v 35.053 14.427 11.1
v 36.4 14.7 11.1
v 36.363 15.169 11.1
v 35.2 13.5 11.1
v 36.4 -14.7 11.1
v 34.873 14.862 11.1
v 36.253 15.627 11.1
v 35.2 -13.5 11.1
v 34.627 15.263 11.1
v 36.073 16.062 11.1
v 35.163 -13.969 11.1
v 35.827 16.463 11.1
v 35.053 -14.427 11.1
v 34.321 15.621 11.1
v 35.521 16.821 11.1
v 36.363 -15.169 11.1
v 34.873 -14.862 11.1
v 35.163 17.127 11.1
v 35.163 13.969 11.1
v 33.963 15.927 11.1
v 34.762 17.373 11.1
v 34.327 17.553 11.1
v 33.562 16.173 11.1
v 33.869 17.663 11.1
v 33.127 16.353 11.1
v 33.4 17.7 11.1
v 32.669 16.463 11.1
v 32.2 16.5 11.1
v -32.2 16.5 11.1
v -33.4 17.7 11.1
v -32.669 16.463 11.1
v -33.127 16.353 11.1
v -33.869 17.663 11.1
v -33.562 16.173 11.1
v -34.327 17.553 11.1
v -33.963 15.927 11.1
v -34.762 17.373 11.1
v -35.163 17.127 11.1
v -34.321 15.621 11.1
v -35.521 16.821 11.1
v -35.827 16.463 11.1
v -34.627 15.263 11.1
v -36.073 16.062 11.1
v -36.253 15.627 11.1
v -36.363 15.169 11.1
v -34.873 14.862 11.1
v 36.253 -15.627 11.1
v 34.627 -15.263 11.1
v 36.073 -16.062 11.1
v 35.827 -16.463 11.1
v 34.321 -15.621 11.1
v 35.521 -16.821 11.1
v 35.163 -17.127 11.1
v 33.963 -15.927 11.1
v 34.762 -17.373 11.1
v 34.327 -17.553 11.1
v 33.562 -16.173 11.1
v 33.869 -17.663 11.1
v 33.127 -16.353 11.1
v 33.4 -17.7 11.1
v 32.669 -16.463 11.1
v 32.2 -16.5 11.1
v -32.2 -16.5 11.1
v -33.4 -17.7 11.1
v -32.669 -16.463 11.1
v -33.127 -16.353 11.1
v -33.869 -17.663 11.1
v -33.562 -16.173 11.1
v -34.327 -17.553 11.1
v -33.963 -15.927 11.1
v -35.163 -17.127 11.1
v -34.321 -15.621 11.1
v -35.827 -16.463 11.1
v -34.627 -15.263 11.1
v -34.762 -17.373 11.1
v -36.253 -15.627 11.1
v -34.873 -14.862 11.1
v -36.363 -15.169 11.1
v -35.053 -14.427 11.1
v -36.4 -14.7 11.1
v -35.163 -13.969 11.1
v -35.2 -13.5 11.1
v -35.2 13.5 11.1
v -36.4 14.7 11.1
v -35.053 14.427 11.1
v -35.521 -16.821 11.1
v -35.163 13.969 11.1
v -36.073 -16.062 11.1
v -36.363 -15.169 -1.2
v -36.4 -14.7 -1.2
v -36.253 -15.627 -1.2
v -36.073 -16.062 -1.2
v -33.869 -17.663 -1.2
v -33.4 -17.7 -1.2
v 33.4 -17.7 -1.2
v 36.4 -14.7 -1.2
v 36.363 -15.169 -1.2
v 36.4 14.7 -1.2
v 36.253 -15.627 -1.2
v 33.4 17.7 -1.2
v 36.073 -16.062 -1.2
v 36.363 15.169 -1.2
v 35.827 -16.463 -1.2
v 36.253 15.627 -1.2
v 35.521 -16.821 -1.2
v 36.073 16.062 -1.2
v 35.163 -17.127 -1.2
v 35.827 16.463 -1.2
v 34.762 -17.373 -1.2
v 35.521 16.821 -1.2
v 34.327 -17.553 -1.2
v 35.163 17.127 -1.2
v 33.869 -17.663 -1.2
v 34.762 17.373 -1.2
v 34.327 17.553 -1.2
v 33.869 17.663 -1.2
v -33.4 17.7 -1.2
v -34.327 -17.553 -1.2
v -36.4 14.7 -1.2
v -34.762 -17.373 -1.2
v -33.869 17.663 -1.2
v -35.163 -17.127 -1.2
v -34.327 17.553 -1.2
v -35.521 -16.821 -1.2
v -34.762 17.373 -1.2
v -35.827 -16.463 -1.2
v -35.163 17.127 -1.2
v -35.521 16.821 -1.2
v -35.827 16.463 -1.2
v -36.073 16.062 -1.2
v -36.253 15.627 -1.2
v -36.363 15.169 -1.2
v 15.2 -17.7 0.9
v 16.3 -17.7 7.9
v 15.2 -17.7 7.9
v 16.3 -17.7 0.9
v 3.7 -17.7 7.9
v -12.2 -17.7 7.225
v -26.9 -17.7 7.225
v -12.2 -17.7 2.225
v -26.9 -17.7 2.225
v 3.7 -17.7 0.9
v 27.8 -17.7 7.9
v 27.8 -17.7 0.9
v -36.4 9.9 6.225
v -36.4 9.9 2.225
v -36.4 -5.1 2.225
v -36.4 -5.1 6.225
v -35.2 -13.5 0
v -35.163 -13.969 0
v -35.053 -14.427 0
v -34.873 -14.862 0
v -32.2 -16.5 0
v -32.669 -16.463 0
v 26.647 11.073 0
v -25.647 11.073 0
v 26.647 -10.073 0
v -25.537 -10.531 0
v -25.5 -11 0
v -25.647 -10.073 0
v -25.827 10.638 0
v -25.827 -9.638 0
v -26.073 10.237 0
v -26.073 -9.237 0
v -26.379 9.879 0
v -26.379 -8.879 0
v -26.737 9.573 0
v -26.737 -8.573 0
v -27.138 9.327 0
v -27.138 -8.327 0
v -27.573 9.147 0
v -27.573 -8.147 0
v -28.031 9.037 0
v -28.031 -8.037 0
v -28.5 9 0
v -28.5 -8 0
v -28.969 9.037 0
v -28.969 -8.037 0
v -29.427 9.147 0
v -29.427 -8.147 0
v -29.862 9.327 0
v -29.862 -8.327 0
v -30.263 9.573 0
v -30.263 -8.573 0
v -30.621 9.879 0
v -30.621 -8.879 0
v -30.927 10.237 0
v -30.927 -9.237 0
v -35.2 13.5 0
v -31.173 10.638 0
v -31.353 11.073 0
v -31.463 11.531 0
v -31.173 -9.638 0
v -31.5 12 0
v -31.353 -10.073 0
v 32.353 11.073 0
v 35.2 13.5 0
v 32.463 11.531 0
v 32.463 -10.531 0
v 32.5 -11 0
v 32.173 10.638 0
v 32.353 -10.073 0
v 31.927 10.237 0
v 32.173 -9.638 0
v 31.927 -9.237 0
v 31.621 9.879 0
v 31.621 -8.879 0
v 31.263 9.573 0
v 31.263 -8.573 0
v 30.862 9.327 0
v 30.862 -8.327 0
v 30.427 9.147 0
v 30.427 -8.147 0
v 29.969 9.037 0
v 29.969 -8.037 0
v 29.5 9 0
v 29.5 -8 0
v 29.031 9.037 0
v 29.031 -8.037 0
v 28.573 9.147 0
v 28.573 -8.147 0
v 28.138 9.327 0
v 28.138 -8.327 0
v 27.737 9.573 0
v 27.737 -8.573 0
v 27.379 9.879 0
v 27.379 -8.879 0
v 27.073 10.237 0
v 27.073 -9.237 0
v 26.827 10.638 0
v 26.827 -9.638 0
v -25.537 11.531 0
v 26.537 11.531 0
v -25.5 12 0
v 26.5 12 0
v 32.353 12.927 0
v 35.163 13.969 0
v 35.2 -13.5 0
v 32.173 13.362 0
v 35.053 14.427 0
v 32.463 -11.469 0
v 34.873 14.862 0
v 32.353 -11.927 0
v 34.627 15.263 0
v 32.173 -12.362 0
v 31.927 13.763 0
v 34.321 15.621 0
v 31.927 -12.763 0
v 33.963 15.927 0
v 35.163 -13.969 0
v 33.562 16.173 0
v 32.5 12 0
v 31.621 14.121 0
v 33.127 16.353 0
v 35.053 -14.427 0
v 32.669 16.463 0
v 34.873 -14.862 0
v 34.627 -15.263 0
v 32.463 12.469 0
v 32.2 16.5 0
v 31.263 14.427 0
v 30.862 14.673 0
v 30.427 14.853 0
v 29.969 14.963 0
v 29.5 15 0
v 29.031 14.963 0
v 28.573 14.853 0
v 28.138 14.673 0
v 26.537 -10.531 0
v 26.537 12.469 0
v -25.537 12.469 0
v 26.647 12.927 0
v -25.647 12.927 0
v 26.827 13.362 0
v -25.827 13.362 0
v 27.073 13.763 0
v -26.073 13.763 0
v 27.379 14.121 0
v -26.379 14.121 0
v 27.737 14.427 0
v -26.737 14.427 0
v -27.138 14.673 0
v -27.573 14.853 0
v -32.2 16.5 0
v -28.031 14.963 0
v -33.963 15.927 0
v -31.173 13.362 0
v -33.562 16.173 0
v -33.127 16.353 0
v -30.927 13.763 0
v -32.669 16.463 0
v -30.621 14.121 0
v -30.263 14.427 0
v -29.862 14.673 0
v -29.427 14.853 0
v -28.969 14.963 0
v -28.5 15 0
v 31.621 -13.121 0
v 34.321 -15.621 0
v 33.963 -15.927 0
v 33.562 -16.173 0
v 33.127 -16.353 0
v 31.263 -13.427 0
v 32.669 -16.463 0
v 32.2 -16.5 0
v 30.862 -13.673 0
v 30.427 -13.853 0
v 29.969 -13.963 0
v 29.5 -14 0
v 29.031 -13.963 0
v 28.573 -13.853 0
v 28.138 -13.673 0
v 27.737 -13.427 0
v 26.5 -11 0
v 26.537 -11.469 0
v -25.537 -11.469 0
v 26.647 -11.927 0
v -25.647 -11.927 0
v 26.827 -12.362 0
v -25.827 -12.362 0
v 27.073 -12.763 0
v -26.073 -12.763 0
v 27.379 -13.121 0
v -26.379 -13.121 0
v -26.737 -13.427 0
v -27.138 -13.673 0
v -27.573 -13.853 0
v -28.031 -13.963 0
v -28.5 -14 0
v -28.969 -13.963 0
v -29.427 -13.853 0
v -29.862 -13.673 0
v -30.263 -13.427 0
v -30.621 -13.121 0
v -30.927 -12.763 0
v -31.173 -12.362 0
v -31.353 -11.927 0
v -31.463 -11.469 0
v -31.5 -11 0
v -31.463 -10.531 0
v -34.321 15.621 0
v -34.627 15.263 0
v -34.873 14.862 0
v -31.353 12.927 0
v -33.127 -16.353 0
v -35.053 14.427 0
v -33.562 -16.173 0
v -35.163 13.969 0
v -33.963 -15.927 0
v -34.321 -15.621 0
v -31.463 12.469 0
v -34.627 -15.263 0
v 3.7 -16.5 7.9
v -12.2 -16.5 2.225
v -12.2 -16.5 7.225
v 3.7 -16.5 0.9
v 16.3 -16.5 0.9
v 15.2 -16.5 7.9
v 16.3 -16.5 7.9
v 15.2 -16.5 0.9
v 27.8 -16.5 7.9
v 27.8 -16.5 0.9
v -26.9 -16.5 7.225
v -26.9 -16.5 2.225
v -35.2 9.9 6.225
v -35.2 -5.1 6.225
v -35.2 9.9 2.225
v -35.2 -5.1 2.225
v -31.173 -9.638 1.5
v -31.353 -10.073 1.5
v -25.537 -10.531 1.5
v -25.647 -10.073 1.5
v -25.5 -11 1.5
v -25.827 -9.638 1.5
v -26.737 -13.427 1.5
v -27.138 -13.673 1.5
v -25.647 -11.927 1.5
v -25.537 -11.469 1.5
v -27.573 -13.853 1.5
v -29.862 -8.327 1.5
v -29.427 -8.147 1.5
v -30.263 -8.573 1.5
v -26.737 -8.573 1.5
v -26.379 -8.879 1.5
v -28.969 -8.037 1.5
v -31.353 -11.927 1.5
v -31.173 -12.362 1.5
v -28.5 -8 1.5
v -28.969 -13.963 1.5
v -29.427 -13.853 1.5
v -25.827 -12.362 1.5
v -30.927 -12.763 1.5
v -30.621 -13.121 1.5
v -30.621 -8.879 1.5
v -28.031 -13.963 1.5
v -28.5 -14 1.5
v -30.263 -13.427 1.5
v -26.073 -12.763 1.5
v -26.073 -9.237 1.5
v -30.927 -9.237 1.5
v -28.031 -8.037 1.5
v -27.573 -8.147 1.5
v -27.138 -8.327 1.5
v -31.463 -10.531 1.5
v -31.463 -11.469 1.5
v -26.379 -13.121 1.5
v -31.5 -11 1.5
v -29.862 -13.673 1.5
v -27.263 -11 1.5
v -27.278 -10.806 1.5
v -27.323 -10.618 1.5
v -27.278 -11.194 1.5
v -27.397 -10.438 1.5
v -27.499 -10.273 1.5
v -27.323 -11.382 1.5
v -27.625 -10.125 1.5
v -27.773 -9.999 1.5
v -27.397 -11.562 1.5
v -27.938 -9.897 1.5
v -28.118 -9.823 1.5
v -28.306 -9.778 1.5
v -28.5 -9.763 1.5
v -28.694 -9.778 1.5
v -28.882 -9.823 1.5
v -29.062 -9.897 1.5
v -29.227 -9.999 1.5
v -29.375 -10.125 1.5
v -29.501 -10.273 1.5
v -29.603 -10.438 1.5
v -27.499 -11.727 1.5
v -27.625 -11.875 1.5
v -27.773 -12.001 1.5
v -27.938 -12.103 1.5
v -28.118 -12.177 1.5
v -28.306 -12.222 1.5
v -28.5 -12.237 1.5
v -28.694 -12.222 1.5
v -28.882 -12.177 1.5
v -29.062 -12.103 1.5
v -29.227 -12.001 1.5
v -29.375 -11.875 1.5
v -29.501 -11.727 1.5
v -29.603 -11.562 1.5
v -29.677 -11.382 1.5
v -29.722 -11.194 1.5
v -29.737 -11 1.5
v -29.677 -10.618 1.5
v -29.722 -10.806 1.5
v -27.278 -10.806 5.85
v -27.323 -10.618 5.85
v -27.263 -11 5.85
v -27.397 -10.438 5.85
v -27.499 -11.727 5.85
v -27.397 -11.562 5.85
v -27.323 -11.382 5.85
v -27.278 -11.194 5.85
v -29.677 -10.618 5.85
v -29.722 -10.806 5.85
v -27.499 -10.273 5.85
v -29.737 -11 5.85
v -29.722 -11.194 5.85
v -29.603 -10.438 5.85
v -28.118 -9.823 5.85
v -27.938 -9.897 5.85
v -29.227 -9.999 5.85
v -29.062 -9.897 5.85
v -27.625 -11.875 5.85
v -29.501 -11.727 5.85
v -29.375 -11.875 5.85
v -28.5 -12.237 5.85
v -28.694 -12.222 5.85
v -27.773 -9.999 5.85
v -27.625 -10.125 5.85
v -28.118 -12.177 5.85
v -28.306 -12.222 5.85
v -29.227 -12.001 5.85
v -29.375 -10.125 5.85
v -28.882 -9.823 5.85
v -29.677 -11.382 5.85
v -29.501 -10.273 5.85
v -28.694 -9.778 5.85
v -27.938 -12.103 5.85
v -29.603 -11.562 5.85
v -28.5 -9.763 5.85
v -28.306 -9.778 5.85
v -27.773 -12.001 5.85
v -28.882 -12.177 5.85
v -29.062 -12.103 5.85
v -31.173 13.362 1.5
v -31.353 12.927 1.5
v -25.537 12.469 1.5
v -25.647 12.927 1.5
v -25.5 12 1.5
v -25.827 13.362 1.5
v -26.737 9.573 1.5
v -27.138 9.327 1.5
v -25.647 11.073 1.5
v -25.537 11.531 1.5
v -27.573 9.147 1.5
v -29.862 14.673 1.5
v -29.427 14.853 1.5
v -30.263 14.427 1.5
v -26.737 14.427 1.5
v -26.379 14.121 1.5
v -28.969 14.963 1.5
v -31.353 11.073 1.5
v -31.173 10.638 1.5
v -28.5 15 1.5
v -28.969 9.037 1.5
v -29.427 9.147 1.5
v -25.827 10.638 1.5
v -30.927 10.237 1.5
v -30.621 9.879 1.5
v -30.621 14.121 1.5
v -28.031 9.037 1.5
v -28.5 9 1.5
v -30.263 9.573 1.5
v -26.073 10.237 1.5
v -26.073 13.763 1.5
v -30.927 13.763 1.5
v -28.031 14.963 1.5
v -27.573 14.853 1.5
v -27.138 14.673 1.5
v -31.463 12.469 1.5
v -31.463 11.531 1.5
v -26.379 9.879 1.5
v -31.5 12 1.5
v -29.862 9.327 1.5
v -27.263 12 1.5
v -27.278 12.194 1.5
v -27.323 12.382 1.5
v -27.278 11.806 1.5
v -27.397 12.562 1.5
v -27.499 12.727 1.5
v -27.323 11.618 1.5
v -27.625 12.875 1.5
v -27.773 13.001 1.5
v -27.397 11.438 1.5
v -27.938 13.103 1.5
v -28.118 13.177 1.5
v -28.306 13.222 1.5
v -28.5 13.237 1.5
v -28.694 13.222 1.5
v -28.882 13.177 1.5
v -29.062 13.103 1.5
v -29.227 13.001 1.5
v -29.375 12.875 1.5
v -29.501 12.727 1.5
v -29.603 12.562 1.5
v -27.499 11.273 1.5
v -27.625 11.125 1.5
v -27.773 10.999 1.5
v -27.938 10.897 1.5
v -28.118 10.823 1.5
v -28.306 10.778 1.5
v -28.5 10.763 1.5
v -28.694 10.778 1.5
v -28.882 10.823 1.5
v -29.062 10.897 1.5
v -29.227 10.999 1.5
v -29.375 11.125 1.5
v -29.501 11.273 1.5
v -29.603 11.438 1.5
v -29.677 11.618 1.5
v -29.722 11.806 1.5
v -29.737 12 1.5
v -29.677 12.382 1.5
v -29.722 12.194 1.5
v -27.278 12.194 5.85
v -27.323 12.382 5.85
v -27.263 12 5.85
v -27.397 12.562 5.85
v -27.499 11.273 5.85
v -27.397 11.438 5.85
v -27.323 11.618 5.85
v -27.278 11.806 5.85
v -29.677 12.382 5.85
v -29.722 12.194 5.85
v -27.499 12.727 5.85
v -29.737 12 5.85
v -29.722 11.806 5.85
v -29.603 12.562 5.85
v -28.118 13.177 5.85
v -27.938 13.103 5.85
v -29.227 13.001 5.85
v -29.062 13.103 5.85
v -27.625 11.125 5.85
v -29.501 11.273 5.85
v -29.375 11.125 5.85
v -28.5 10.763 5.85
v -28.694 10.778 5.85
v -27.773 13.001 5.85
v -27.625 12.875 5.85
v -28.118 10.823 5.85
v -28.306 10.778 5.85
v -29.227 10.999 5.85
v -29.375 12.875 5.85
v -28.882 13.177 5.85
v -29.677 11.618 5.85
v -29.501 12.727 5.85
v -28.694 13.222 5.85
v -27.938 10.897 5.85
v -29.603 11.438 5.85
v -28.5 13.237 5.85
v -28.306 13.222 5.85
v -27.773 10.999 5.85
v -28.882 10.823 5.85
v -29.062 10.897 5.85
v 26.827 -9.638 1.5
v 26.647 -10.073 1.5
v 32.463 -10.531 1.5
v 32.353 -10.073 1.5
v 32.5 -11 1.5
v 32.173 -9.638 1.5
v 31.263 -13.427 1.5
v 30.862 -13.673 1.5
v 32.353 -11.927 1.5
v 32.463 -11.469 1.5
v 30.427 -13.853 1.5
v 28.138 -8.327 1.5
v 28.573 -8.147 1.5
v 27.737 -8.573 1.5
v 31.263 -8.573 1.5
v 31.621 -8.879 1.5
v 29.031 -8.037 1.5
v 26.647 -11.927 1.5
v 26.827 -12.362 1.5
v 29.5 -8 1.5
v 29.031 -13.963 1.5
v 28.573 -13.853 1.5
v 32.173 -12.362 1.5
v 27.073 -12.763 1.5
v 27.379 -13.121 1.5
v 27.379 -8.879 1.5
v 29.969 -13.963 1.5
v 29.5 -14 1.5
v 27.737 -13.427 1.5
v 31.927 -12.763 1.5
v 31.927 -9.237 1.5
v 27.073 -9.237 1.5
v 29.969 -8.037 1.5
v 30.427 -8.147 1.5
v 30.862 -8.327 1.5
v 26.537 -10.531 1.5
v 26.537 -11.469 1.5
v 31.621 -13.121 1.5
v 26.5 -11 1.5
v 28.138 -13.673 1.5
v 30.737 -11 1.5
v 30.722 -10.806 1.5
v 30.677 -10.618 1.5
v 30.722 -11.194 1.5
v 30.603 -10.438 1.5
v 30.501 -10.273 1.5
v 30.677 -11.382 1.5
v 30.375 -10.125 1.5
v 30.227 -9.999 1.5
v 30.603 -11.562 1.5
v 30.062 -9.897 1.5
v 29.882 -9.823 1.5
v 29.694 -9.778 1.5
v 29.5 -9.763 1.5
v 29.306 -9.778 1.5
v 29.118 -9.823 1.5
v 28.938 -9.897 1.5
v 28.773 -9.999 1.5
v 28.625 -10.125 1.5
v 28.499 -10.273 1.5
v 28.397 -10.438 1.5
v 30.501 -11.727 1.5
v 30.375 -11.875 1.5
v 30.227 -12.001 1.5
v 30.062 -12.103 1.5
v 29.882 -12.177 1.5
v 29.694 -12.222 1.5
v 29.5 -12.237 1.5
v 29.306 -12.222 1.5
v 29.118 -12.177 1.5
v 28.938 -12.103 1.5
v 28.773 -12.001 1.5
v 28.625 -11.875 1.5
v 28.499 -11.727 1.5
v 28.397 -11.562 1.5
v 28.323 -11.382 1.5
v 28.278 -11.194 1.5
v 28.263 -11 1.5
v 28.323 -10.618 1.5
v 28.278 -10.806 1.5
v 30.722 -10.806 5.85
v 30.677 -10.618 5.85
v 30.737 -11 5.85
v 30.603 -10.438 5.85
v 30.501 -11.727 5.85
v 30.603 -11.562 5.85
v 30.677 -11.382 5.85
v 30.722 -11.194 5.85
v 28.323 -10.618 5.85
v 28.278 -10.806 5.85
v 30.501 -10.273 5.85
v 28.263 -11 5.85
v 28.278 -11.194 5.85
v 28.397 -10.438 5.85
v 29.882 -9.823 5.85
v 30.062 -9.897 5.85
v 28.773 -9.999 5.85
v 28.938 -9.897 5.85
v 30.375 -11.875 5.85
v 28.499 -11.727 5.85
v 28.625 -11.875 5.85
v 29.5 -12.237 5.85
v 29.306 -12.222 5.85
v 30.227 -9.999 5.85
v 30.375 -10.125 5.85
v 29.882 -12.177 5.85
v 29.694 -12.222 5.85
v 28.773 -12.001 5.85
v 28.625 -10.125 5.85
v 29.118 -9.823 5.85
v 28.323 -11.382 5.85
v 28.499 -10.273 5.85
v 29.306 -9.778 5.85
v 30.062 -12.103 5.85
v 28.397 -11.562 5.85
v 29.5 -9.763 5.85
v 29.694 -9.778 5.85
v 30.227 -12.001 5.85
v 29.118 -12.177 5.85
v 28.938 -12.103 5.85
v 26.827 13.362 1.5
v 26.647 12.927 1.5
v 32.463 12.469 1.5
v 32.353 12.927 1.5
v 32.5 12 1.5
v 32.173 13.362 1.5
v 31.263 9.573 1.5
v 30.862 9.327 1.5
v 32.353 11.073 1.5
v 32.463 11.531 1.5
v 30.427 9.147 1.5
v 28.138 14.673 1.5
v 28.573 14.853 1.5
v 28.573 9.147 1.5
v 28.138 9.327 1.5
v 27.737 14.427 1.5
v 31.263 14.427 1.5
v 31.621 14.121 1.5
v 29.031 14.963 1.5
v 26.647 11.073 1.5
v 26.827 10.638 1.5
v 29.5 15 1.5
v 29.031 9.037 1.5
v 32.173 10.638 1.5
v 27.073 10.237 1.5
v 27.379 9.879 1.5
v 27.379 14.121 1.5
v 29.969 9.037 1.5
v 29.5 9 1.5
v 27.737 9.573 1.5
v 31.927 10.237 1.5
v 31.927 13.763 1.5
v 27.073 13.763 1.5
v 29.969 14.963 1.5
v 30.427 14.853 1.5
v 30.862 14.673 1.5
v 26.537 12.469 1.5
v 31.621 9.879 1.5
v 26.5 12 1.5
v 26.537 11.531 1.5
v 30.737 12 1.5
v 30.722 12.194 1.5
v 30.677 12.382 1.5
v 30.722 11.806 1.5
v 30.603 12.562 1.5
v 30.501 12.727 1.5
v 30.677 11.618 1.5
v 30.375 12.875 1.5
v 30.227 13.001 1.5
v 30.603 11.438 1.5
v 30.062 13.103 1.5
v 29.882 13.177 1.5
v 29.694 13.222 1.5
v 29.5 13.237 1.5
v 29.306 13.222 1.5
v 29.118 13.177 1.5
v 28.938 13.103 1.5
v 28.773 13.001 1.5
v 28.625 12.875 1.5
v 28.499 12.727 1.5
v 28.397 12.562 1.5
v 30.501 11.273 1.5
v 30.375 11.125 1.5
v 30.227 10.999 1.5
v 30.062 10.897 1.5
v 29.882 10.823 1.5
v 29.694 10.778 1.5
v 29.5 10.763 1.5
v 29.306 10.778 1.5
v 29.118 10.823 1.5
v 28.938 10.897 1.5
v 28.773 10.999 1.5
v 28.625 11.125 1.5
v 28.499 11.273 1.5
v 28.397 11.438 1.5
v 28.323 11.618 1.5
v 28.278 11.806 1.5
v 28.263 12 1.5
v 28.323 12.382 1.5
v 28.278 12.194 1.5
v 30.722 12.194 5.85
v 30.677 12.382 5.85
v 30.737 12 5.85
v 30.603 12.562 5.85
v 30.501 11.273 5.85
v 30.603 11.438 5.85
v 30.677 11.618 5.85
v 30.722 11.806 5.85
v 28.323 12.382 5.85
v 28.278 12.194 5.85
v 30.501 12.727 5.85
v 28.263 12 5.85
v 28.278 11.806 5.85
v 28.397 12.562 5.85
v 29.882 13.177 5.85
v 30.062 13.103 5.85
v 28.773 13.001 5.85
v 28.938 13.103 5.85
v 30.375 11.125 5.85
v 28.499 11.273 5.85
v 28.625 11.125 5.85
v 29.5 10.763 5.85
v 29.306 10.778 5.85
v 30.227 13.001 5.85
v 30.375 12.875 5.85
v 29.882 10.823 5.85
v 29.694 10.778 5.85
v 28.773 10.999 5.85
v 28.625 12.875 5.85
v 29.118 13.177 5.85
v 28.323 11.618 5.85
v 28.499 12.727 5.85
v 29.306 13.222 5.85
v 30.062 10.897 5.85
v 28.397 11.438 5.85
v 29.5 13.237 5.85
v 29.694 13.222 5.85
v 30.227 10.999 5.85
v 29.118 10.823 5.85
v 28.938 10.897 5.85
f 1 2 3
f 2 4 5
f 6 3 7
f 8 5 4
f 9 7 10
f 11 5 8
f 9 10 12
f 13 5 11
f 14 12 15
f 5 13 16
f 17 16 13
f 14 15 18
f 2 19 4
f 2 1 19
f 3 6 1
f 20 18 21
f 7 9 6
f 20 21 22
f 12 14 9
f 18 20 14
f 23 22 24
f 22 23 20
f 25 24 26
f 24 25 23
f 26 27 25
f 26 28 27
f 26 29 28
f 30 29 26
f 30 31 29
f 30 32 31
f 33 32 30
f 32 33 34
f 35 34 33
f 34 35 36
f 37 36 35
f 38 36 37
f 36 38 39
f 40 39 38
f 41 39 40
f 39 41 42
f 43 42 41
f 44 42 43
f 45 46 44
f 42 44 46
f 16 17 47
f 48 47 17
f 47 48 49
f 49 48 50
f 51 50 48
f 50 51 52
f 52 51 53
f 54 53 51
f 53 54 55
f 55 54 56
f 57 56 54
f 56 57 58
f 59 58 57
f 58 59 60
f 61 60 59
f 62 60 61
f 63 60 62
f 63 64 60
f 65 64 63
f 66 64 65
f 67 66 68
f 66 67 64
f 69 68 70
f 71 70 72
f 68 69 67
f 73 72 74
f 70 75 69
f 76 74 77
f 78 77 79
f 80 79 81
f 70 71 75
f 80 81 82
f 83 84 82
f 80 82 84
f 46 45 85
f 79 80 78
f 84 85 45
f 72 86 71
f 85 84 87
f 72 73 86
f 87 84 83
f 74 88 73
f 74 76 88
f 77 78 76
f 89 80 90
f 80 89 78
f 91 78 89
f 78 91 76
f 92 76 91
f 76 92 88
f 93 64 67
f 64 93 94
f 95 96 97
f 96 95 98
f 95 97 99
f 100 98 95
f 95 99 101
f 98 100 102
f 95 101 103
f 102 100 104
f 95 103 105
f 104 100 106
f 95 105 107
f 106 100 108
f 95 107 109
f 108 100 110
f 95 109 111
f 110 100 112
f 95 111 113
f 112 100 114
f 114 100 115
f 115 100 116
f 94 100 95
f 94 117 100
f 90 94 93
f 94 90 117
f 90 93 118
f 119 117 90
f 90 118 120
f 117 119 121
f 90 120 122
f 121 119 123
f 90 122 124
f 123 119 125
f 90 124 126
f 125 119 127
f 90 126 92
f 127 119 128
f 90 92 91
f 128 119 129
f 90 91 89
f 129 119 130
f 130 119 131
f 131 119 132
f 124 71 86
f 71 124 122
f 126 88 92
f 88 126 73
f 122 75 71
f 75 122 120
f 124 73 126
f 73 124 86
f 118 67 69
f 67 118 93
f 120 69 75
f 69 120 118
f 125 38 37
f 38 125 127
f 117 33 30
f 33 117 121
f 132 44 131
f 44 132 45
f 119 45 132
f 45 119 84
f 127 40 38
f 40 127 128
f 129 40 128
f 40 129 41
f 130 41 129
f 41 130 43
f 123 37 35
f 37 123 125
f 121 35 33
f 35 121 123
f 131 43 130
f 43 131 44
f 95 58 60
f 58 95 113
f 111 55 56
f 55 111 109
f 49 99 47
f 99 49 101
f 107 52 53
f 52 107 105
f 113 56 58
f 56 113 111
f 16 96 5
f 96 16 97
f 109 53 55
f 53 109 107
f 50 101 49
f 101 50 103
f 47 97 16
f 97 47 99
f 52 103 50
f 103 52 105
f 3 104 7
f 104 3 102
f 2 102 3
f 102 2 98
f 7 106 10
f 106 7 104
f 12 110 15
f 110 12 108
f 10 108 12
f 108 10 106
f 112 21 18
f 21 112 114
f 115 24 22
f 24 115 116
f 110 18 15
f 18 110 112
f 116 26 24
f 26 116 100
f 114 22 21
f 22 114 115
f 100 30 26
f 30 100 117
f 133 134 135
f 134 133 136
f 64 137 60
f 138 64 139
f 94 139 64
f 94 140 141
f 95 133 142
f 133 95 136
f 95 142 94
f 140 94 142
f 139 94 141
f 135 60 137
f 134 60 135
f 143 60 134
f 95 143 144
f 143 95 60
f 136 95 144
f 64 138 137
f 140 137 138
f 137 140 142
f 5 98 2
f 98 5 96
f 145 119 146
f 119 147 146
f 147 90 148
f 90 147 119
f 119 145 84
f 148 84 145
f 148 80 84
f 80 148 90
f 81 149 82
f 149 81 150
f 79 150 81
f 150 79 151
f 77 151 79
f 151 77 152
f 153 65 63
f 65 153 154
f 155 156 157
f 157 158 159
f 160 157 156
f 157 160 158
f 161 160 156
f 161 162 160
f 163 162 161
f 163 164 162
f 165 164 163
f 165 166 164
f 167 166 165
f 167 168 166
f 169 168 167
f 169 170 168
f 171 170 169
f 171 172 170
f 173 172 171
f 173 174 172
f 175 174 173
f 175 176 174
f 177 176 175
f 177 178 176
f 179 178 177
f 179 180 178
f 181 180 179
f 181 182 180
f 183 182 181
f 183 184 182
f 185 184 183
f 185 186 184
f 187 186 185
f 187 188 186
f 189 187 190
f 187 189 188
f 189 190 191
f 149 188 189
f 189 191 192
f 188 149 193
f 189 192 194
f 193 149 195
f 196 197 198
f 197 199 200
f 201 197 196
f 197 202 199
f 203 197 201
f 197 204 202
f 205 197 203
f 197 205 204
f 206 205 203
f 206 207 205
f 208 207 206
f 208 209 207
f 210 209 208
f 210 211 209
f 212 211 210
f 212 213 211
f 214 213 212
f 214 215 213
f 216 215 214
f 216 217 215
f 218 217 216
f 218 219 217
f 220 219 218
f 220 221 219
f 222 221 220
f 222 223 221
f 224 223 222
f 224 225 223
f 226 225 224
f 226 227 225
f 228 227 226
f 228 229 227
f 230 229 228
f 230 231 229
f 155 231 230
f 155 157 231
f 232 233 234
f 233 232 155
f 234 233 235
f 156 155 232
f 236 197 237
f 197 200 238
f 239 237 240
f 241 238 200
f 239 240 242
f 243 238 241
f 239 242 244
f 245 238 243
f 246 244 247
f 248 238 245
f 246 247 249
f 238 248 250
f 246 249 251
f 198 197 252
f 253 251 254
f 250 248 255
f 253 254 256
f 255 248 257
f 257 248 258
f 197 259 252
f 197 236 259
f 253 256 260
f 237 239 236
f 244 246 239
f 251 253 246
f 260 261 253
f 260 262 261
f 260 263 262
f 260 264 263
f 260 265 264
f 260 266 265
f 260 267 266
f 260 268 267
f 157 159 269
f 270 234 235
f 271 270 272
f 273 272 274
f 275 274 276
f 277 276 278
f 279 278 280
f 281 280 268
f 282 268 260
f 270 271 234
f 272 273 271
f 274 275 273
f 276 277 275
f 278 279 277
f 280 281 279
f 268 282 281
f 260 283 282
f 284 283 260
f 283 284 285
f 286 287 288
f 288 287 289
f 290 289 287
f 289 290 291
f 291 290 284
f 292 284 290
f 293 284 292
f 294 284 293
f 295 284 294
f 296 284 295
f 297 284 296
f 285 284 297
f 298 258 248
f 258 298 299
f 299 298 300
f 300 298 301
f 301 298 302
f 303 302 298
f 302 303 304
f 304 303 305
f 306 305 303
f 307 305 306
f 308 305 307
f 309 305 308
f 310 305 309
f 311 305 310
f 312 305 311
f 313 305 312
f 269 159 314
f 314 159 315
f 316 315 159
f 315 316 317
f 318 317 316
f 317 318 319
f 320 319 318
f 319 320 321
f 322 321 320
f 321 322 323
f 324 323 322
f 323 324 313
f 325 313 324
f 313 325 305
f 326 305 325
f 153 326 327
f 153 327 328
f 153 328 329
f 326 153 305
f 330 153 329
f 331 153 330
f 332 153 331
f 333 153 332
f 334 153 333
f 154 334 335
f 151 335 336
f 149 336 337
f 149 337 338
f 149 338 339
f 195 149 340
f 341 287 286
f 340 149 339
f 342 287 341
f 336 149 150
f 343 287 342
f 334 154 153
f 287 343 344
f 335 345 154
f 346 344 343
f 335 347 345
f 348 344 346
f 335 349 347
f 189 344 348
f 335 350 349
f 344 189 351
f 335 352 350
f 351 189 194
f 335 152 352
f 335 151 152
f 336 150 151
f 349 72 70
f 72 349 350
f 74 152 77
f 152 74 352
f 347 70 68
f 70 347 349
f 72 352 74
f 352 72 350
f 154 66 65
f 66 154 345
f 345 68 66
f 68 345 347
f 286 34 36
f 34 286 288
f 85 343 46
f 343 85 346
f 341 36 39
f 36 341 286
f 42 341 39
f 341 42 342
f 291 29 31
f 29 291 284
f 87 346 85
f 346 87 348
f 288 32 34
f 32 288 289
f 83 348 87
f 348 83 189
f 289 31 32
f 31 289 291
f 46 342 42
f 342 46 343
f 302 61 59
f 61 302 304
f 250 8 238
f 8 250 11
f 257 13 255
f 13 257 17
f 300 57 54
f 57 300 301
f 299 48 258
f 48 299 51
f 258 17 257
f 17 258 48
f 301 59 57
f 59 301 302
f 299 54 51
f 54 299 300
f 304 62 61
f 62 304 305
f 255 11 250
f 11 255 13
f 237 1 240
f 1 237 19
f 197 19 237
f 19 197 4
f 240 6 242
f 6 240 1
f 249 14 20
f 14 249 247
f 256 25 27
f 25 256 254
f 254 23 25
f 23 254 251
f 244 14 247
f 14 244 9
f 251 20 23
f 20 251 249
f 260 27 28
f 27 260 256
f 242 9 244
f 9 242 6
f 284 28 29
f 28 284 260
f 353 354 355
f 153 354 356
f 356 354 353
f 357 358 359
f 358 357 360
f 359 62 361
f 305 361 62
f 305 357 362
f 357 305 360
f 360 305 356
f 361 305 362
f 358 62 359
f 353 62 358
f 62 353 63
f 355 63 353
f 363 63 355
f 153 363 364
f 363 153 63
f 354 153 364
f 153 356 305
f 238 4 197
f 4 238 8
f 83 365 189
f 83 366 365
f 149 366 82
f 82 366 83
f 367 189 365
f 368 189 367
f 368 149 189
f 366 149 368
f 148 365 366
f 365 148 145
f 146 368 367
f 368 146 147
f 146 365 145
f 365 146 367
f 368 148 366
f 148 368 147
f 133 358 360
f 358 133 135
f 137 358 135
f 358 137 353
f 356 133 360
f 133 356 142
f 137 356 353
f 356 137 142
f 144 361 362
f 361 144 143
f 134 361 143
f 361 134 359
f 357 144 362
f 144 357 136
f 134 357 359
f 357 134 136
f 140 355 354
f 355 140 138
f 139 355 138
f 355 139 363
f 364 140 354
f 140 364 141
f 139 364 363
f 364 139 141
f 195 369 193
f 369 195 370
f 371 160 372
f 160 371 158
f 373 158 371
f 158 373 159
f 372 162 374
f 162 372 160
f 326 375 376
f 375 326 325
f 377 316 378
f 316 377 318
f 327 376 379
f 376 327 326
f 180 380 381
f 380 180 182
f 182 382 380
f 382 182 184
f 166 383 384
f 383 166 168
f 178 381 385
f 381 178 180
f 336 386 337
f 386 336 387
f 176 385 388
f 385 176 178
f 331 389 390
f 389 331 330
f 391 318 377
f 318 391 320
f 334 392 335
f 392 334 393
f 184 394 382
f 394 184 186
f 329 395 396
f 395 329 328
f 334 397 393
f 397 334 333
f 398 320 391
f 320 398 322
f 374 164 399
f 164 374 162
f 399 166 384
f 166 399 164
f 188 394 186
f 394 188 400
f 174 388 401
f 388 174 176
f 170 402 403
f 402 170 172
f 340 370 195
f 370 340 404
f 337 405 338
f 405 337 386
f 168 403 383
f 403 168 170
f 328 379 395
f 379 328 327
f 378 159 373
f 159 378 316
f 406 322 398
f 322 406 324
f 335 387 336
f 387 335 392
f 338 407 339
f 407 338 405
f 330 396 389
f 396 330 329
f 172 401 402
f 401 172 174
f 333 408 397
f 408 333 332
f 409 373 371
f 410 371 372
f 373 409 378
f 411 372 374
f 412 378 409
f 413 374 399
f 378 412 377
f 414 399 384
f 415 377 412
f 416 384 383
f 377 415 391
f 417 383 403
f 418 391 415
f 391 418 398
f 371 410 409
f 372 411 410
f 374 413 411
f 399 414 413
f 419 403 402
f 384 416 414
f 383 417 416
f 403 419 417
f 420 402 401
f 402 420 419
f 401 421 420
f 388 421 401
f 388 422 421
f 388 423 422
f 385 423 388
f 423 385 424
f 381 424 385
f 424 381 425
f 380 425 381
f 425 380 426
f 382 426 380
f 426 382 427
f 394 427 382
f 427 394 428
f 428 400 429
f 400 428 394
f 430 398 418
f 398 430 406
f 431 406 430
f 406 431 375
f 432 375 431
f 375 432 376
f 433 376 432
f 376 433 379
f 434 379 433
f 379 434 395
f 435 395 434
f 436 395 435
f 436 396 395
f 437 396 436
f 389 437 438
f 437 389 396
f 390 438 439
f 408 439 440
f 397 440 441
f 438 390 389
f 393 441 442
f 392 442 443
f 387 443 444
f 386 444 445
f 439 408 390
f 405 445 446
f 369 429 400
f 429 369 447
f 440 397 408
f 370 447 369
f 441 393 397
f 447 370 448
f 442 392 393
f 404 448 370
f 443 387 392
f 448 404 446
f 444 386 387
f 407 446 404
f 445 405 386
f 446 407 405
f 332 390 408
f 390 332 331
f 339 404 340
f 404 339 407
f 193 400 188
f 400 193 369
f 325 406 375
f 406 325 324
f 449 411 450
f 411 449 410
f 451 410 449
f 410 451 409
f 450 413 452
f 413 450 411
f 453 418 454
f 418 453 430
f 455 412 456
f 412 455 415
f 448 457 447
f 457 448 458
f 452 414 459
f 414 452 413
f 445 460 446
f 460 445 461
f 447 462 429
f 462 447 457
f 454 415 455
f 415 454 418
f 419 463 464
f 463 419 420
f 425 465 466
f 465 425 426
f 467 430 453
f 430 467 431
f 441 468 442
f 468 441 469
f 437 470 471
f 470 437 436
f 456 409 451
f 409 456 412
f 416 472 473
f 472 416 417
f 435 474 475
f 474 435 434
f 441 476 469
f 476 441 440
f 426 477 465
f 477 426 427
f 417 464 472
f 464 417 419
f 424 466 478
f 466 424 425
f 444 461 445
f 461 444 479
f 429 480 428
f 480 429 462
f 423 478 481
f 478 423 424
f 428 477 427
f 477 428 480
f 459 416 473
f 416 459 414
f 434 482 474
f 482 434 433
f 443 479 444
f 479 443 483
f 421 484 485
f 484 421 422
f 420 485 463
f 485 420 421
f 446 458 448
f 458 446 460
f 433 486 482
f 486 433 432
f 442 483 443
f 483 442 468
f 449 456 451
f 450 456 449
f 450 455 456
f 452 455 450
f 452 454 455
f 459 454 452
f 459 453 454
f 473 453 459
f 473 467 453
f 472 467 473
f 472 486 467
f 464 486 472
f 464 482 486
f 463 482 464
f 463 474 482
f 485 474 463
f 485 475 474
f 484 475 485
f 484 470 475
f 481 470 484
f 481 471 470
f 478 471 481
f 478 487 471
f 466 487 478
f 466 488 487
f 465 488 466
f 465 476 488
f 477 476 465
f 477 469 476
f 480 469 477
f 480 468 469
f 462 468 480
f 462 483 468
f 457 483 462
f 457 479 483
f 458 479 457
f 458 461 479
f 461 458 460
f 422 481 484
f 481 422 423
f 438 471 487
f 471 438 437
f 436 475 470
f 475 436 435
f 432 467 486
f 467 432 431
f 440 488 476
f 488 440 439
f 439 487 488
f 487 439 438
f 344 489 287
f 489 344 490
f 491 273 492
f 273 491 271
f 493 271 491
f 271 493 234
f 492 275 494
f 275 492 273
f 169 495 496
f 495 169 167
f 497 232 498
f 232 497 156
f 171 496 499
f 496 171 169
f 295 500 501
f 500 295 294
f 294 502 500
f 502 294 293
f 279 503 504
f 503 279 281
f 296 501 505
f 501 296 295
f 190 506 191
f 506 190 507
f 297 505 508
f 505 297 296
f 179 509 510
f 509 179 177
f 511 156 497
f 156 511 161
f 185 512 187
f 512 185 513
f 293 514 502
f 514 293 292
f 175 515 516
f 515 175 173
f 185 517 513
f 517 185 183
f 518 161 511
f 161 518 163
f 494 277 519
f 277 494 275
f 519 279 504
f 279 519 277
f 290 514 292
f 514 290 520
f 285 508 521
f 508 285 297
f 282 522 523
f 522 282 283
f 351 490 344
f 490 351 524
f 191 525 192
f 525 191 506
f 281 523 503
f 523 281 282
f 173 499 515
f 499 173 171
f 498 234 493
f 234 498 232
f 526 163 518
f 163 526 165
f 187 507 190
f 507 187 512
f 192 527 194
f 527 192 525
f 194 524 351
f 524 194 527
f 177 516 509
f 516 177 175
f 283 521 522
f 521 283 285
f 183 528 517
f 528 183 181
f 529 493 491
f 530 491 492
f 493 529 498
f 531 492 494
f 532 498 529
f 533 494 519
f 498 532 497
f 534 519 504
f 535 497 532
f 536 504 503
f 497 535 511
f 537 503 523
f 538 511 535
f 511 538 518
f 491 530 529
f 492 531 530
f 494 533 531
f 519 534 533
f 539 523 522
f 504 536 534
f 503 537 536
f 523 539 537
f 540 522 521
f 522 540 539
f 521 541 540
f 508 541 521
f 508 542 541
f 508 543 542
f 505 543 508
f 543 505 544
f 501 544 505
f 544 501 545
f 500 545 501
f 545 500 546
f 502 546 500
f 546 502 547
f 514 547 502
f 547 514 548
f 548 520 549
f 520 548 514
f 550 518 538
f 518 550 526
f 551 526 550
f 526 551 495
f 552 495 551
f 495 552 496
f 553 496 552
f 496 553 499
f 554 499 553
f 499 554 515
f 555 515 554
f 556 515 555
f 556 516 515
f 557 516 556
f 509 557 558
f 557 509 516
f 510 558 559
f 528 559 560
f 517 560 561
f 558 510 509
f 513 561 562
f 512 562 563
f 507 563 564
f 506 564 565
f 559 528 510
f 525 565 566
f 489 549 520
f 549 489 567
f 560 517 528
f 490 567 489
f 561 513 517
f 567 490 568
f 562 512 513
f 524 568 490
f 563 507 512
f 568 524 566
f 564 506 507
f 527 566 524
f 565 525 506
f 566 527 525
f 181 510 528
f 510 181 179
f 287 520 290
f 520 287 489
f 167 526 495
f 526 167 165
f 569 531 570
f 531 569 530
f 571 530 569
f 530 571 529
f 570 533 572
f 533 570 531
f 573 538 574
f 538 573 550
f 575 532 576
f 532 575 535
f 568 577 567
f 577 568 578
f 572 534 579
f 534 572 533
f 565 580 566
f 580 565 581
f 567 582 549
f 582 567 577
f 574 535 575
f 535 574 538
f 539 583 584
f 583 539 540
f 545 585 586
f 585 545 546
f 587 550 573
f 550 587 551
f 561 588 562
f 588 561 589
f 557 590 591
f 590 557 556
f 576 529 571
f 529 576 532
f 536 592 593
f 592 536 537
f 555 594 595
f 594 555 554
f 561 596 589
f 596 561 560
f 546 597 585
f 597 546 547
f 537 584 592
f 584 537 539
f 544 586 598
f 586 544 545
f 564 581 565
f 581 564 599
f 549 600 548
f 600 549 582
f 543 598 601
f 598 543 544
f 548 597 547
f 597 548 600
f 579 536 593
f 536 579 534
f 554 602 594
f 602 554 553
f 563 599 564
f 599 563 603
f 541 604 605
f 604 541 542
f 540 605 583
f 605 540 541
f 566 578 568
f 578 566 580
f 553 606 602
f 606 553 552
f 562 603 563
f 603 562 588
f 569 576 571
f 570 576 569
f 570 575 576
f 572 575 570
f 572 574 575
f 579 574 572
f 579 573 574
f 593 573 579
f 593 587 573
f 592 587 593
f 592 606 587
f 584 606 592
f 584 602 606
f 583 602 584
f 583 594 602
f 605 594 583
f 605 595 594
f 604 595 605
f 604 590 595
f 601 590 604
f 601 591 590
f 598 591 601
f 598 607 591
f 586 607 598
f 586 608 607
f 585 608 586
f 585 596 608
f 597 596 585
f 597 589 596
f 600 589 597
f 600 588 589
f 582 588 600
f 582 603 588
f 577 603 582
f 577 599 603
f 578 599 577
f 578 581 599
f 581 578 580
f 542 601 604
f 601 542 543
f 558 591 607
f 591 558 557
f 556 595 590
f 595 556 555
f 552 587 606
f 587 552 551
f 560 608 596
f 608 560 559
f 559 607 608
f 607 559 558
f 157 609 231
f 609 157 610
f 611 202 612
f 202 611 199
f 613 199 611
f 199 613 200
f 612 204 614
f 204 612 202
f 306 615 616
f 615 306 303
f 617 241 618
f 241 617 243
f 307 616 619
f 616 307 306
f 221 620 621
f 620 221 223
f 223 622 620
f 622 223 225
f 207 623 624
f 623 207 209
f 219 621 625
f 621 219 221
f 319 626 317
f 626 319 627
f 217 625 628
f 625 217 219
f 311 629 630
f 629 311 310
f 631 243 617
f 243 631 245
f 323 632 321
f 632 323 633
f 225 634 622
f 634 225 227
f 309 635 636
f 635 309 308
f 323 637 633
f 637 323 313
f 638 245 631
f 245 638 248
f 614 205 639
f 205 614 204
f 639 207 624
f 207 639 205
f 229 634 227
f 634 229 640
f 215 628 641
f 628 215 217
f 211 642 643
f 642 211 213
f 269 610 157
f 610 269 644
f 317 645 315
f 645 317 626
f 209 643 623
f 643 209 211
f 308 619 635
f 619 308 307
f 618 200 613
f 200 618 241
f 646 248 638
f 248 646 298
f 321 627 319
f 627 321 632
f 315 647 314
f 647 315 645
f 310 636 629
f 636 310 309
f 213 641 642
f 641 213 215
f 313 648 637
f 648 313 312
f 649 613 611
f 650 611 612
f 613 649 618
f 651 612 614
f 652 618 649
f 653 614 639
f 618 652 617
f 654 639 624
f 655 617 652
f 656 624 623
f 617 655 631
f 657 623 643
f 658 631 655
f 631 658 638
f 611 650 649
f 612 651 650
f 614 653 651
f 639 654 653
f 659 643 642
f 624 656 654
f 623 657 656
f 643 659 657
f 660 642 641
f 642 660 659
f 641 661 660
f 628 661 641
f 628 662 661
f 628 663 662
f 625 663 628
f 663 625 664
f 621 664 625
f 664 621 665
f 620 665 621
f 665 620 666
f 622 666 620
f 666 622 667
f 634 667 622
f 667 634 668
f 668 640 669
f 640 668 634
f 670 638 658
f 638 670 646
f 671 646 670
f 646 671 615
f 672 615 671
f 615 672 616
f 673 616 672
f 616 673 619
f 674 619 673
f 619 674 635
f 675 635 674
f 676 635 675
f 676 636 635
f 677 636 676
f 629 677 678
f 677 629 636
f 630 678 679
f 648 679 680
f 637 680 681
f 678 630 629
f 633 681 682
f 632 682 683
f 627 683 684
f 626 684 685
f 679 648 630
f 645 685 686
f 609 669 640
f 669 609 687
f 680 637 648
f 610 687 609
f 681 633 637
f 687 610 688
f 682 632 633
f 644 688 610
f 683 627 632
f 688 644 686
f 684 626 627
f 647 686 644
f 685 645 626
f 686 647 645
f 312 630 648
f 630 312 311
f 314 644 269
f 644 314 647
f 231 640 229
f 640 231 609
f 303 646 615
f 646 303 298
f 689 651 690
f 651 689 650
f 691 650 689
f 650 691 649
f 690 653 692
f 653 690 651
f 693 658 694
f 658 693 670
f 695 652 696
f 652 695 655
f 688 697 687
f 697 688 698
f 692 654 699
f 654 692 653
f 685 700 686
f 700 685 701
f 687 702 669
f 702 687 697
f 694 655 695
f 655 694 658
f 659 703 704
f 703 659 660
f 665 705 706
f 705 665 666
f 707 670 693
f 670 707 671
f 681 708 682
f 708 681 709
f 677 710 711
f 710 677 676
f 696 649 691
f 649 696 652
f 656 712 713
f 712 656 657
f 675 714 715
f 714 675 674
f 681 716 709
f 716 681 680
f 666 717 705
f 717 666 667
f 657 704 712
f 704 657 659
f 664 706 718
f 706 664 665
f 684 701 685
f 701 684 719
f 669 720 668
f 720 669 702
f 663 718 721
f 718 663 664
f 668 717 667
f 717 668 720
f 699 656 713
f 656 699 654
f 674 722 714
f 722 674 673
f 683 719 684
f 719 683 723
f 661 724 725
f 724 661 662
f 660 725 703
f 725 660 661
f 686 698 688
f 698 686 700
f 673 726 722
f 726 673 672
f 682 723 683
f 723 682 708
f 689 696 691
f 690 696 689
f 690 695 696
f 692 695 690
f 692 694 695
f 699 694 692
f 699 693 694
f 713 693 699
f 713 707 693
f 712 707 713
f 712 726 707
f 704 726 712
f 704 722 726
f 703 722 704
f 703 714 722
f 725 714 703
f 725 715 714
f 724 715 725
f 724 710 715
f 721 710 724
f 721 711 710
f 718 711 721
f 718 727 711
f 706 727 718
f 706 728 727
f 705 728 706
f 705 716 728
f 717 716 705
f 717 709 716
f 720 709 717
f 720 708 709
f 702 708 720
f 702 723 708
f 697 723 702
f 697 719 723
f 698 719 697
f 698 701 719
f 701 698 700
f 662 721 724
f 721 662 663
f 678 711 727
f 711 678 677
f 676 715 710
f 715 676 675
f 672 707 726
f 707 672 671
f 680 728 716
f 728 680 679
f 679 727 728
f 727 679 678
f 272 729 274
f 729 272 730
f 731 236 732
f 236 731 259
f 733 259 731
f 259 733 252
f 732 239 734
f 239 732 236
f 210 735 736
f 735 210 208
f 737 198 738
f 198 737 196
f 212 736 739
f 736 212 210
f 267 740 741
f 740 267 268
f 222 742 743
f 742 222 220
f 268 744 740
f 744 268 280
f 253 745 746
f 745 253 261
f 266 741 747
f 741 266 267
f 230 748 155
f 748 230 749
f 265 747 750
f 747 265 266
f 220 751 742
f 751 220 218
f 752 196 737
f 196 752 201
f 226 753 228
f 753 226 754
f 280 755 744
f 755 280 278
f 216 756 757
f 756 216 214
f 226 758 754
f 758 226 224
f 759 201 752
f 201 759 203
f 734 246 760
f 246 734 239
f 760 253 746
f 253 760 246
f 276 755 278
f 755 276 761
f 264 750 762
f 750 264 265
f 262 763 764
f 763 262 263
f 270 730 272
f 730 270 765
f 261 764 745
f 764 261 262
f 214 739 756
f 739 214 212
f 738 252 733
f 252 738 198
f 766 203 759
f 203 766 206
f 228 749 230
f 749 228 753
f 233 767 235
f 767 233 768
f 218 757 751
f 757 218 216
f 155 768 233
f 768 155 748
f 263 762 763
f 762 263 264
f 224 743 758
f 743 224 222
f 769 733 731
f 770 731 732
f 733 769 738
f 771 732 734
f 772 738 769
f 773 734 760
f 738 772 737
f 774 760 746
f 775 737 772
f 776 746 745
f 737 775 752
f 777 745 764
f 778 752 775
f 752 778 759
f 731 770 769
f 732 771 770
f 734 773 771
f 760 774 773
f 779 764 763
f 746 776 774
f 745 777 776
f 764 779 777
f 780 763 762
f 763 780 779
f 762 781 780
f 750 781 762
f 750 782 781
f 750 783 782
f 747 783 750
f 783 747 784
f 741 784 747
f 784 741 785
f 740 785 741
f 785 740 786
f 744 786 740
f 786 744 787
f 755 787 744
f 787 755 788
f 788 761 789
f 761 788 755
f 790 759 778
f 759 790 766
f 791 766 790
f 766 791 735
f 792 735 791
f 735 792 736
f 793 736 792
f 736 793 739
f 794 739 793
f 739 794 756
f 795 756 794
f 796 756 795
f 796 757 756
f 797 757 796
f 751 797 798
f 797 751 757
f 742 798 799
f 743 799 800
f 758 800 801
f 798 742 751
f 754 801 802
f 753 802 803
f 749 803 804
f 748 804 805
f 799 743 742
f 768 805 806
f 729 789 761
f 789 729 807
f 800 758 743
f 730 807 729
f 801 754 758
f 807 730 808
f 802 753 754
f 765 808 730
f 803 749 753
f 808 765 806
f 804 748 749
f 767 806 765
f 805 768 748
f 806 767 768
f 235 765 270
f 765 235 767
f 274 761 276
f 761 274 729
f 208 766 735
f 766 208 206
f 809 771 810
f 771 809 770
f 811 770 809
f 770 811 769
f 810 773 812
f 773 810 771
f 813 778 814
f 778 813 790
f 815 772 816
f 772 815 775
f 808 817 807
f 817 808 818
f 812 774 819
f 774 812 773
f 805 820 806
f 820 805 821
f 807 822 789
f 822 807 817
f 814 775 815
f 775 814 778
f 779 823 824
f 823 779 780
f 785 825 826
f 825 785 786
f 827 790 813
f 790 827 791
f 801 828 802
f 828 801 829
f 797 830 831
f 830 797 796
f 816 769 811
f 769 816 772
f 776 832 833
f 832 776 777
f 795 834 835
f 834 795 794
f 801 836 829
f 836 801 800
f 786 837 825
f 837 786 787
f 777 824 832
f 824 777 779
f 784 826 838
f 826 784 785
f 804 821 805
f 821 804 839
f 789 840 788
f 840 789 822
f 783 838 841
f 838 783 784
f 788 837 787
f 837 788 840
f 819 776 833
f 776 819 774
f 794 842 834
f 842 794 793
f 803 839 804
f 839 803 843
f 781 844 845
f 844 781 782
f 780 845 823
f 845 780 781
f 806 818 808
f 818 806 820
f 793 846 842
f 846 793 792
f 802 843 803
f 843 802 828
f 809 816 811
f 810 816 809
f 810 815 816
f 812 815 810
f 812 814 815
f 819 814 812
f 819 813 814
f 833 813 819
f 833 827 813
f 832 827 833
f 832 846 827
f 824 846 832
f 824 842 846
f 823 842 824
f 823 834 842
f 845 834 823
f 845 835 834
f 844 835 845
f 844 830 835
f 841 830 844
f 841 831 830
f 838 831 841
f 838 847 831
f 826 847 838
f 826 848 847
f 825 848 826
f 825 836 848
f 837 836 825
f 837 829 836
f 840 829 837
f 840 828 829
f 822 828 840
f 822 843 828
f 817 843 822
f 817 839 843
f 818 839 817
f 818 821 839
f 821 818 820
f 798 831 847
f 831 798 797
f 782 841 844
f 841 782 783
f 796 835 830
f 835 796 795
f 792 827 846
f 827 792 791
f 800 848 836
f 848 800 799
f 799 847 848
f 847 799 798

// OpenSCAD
/*
    A box for the pizero(/w).
    Designed to allow the pizero to be completely in the box, resiliant to
    dust and pokey fingers.
    
    * Configurable connector holes
    * Either holes, for screws/bolts, or mounting pins for the pizero
    * Engineering model of a pizero, so you can check if it looks right
        - remember to turn this off before generating an STL
        
    TODO:
    * Calculate everything, remove magic numbers
    * Cut outs the gland on the lid to allow connectors right into the pizero
*/

// THINGIVERSE customizer does not understand true/flase, so use 1/0 instead

/* [parts] */
make_bottom=1;   // [0:No,1:Yes] 
make_top=0;      // [0:No,1:Yes] 

/* [connectors] */
sdcard_hole = 1; // [0:No,1:Yes] 
power_hole = 1;  // [0:No,1:Yes] 
hdmi_hole = 1;   // [0:No,1:Yes] 
usb_hole = 1;    // [0:No,1:Yes] 
camera_hole = 0; // [0:No,1:Yes] 
gpio_hole = 1;   // [0:No,1:Yes] 
pins = 1;        // [0:No,1:Yes] 

/* [box] */
// gap around pizero inside the box
gap = 1.0;
// wall thickness of box
shell_thickness = 1.2;
// standoffs pizero sits on in the box
standoffs = 1.5;

/* [Text on lid] */
// Add an engraved text on the top, 'help->font list' for available
add_text = 1;  // [0:No,1:Yes]
lid_text = "pizerow";
text_font="Comic Sans MS"; 

/* [pizero options] */
// show an engineering model
dummy_pizero = 0;  // [0:No,1:Yes] 
// do we need height for a header
//pz_header = 0; // not tested, problems with heights 
// allow for solder on bottom, standoffs take care of this
//pz_solder = 0;    // don't need to allow for this as we have standoffs

// the pizero engineering model with the measurements we use, includes don't work in thingiverse customizer
//include <pizerow.scad>;

//////////////////////////////
//
// Start of included pizero engineering model
//
////////////////////
/* [pizero dimensions DO NOT ALTER] */
pz_length = 65; // not including sd card protrusion
pz_width = 30;  // not including any connector protrusions
pz_pcb_thickness = 1.45; // including solder mask
pz_component_max_height = (3.1 - pz_pcb_thickness); // hdmi is max
pz_rounded_edge_offset = 3.0;
pz_botton_pin_height = 1.0;  // solder pins for gpio connector

pz_mount_hole_dia = 2.75; 
pz_mount_hole_offset = 3.5; // from edge
pz_mount_hole_dia_clearance = 6; 

pz_gpio_length = 50.8; // total 
pz_gpio_width = 5;  // total
pz_gpio_x_offset = 32.5;  // from left hand edge to centre of connector
pz_gpio_y_offset = 3.5; // long edge centre form pcb edge
pz_gpio_height = (9.8 - pz_pcb_thickness); // wihtout pcb thickness

pz_sdcard_y_offset = 16.9;
pz_sdcard_length = 15.4; // sdcard present
pz_sdcard_width = 12;
pz_sdcard_protrusion = 2.3; // sdcard present
pz_sdcard_height = (2.8 - pz_pcb_thickness); 

pz_camera_y_offset = 15;
pz_camera_length = 4.43;
pz_camera_width = 17;
pz_camera_protrusion = 1.1; // no cable present
pz_camera_height = (2.65 - pz_pcb_thickness);

pz_hdmi_x_offset = 12.4;
pz_hdmi_length = 11.2;
pz_hdmi_width = 7.6;
pz_hdmi_protrusion = 0.5; // no cable present
pz_hdmi_height = (4.7 - pz_pcb_thickness);

pz_usb_power_x_offset = 54;
pz_usb_x_offset = 41.4;
pz_usb_length = 8;
pz_usb_width = 5.6;
pz_usb_protrusion = 1; // no cable present
pz_usb_height = (3.96 - pz_pcb_thickness);

pz_max_length = pz_length + pz_sdcard_protrusion + pz_camera_protrusion;
pz_max_width = pz_width + pz_usb_protrusion;
///////////////////////////////////
//
// End of pizero definitions
//
////////////////////

//////////////////////////////////
//
// Start of pizero functions/modules
//
////////////////////////
function pz_get_max_height(gpio_header, gpio_solder) =
    pz_pcb_thickness  + 
    (pz_botton_pin_height * (gpio_solder?1:0)) + 
    (pz_gpio_height * (gpio_header?1:0)) +
    (pz_component_max_height * (gpio_header?0:1));


module pzw(gpio_header = true, gpio_solder = true) { 

    pz_max_height = pz_get_max_height(gpio_header, gpio_solder);
    
    echo("pi max length ", pz_max_length);
    echo("pi max width  ", pz_max_width);
    echo("pi max height ", pz_max_height);

    module pzw_solid() {
        // rounded edges on pcb
        x_round = [pz_rounded_edge_offset, (pz_length - pz_rounded_edge_offset)];
        y_round= [pz_rounded_edge_offset, (pz_width - pz_rounded_edge_offset)];
        for (x = x_round, y = y_round)
            translate([x, y, 0])
            {
                $fn = 40;
                cylinder(d=(2*pz_rounded_edge_offset), h=pz_pcb_thickness);
            }  

        // pcb split into bits to conform with rounded edges
        translate([pz_rounded_edge_offset, 0, 0])
            cube([pz_length - (2 * pz_rounded_edge_offset), pz_width, pz_pcb_thickness]);
        translate([0, pz_rounded_edge_offset, 0])
            cube([pz_length, pz_width - (2 * pz_rounded_edge_offset), pz_pcb_thickness]);

        // gpio 
        if (gpio_header)
        translate([pz_gpio_x_offset-(pz_gpio_length/2), 
                  (pz_width-pz_gpio_y_offset-(pz_gpio_width/2)), 
                  pz_pcb_thickness])
            cube([pz_gpio_length, pz_gpio_width, pz_gpio_height]);

        // gpio underside solder
        if (gpio_solder)
        translate([pz_gpio_x_offset-(pz_gpio_length/2), 
                  (pz_width-pz_gpio_y_offset-(pz_gpio_width/2)), 
                  -pz_botton_pin_height])
            cube([pz_gpio_length, pz_gpio_width, pz_botton_pin_height]);
        
        // sdcard 
        translate([-pz_sdcard_protrusion, 
                  (pz_sdcard_y_offset-(pz_sdcard_width/2)), 
                  pz_pcb_thickness])
            cube([pz_sdcard_length, pz_sdcard_width, pz_sdcard_height]);

        // camera
        translate([(pz_length - pz_camera_length + pz_camera_protrusion), 
                   (pz_camera_y_offset-(pz_camera_width/2)), 
                    pz_pcb_thickness])
            cube([pz_camera_length, pz_camera_width, pz_camera_height]);
            
        // hdmi 
        translate([(pz_hdmi_x_offset - (pz_hdmi_length/2)), 
                   -pz_hdmi_protrusion, 
                    pz_pcb_thickness])
            cube([pz_hdmi_length, pz_hdmi_width, pz_hdmi_height]);
            
        // usb power 
        translate([(pz_usb_power_x_offset - (pz_usb_length/2)), 
                   -pz_usb_protrusion, 
                    pz_pcb_thickness])
            cube([pz_usb_length, pz_usb_width, pz_usb_height]);
        
        // usb 
        translate([(pz_usb_x_offset - (pz_usb_length/2)), 
                   -pz_usb_protrusion, 
                    pz_pcb_thickness])
            cube([pz_usb_length, pz_usb_width, pz_usb_height]);
    }
    
    // make 0,0,0 centre
    translate([pz_camera_protrusion+pz_camera_protrusion-pz_max_length/2, 
               pz_usb_protrusion-pz_max_width/2, 
               0])
    difference () {
        pzw_solid();

        // mounting holes
        x_holes = [pz_mount_hole_offset, (pz_length - pz_mount_hole_offset)];
        y_holes = [pz_mount_hole_offset, (pz_width - pz_mount_hole_offset)];
        for (x = x_holes, y = y_holes)
            translate([x, y, -pz_pcb_thickness])
            {
                $fn = 40;
                cylinder(d=pz_mount_hole_dia, h=10);
            }
   }
}
////////////////////////////////////////
//
// End of pizero functions/modules
//
////////////////////////////

case_inside_length = pz_max_length + 2*gap;
case_inside_width = pz_max_width + 2*gap;
case_inside_height = pz_get_max_height(true, true) + standoffs; 

case_outside_length = case_inside_length + (2*shell_thickness);
case_outside_width = case_inside_width + (2*shell_thickness);
case_outside_height = case_inside_height; //+ (2*shell_thickness);

module rounded_box(length, 
             width, 
             height, 
             rounded_edge_radius) 
{    
    
    // rounded edges
    x_round = [rounded_edge_radius, (length - rounded_edge_radius)];
    y_round= [rounded_edge_radius, (width - rounded_edge_radius)];
    for (x = x_round, y = y_round)
        translate([x, y, 0])
        {
            $fn = 40;
            cylinder(d=(2*rounded_edge_radius), h=height);
        }  

    // pcb split into bits to conform with rounded edges
    translate([rounded_edge_radius, 0, 0])
        cube([length - (2 * rounded_edge_radius), 
                width, 
                height]);
    translate([0, rounded_edge_radius, 0])
        cube([length, 
                width - (2 * rounded_edge_radius), 
                height]);    
}

module shell(inside_length, 
             inside_width, 
             inside_height, 
             thickness, 
             rounded_edge_radius) 
{
    difference () 
    {
        // outside
        translate([-thickness, -thickness, -thickness])
            rounded_box(case_outside_length, 
                case_outside_width, 
                case_outside_height,
                rounded_edge_radius);
    
        // inside, remove top by extending it through the outside
        rounded_box(inside_length, inside_width, case_outside_height+1, rounded_edge_radius);
        
        if (sdcard_hole) {
            offset = 10.4 + gap; // magic number for centre line
            translate([-case_outside_length/8, offset, standoffs+pz_pcb_thickness/2])
                #cube([case_outside_length/4, pz_sdcard_width+3, 4]);
        }
        
        if (usb_hole) {
            offset = 37.9 + gap;
            translate([offset, -case_outside_width/4, standoffs-0.6])
                #cube([pz_usb_length+3.5, case_outside_length/4, 7]);
        }

        if (power_hole) {
            offset = 50.5 + gap;
            translate([offset, -case_outside_width/4, standoffs-0.6])
                #cube([pz_usb_length+3.5, case_outside_length/4, 7]);
        }
        
        // hole for camera
        if (camera_hole) {
            offset = 8.5 + gap;
            translate([case_outside_length/1.25, offset, (standoffs+pz_pcb_thickness)])
                #cube([case_outside_length/4, pz_camera_width-2, 1.2]);
        }
        if (hdmi_hole) {
            offset = 7.3 + gap;
            translate([offset, -case_outside_width/4, standoffs+pz_pcb_thickness/2])
                #cube([pz_hdmi_length+3.5, case_outside_length/4, 5]);
        }
    }
}

module bottom_shell() {
    translate([-case_inside_length/2, -case_inside_width/2, 0])
        shell(case_inside_length, 
              case_inside_width, 
              case_inside_height, 
              shell_thickness, 
              pz_rounded_edge_offset);

    // mounting standoffs and pins for pizero
    translate([pz_camera_protrusion+pz_camera_protrusion-pz_max_length/2,
                pz_usb_protrusion-pz_max_width/2, 0]) 
    {
        x_pins = [pz_mount_hole_offset, (pz_length - pz_mount_hole_offset)];
        y_pins = [pz_mount_hole_offset, (pz_width - pz_mount_hole_offset)];
        for (x = x_pins, y = y_pins)
            translate([x, y, 0])
            {
                $fn = 40;
                cylinder(d=pz_mount_hole_dia_clearance, h=standoffs);
                translate([0, 0, standoffs])
                    if (pins) 
                    {
                        // allow for some slack in the hole diameter, 0.9
                        // pins longer then pcb is thick so pcb can't slip out
                        cylinder(d=(pz_mount_hole_dia*0.9), h=3*pz_pcb_thickness);
                    }
            }
    }  
    
    // for reference we can add a dummy pizero
    if (dummy_pizero) {
        color("yellow")
            translate([0, 0, standoffs]) // add 20 for outside box
                pzw(true, true);
    }
}


module bottom() {
    difference() 
    {
        bottom_shell();
        // holes right through instead of pins
        if (!pins) 
        {
            translate([pz_camera_protrusion+pz_camera_protrusion-pz_max_length/2,
                    pz_usb_protrusion-pz_max_width/2, 0]) 
            {
                x_pins = [pz_mount_hole_offset, (pz_length - pz_mount_hole_offset)];
                y_pins = [pz_mount_hole_offset, (pz_width - pz_mount_hole_offset)];
                for (x = x_pins, y = y_pins)
                    translate([x, y, 0])
                    {
                        $fn = 40;
                        translate([0, 0, -2*shell_thickness])
                            #cylinder(d=(pz_mount_hole_dia*1.1), h=2*case_inside_height);
                    }
            }
        }
    }
}

module top_with_rim() {
    // add an extra layer on top to cover the gpio hole
    lid_thickness = (gpio_hole)?(shell_thickness):(shell_thickness+1);
    rounded_box(case_outside_length, case_outside_width, lid_thickness, pz_rounded_edge_offset);
    
    // need to make a rim/gland
    translate([shell_thickness, shell_thickness, -2*shell_thickness]) 
    {
        // translate to make sure that rim is part of the top
        translate([0,0,0.5]) 
        difference() 
        {
            rounded_box(case_outside_length - 2*shell_thickness, 
                         case_outside_width - 2*shell_thickness, 
                         2*shell_thickness, 
                         pz_rounded_edge_offset);
            
            // make a gland type rim by extending through the inside box
            translate([shell_thickness, shell_thickness, -shell_thickness])
                rounded_box(case_inside_length - 2*shell_thickness, 
                            case_inside_width - 2*shell_thickness, 
                            3*shell_thickness, 
                            pz_rounded_edge_offset);
        }
    }
}

module top () {
    color("orange")
    
    translate([-case_inside_length/2-shell_thickness, 
                -case_inside_width/2-shell_thickness, 
                case_outside_height+shell_thickness]) 
        difference () 
        {
            top_with_rim();
         
            // always cut out for gpio pins
            offset_x = 9.9 + gap; // magic numbers
            offset_y = 25.4 + gap;
            translate([offset_x, offset_y, -3*shell_thickness])
                #cube([pz_gpio_length+2, 
                       pz_gpio_width+2,
                       4*shell_thickness+0.3]);
            
            // a notch to make taking top of easier
             translate([0, 10+gap, -0.1])
                cube([shell_thickness, 
                       15,
                       shell_thickness*0.6]);
            
            // text, really deep text if we have no gpio cutout
            if(add_text) 
            {
                translate([case_outside_length/2,case_outside_width*0.5,shell_thickness*0.5]) 
                    linear_extrude(5, convexity=4) 
                        text(lid_text, font=text_font, valign="center", halign="center");
            }
        }
    
    if (pins)
    {
        // add locking pins to lid
        // values iteratively found 
        translate([pz_camera_protrusion+pz_camera_protrusion-pz_max_length/2, 
                    pz_usb_protrusion-pz_max_width/2,
                    case_outside_height - 2.9*shell_thickness]) 
        {
            x_pins = [pz_mount_hole_offset, (pz_length - pz_mount_hole_offset)];
            y_pins = [pz_mount_hole_offset, (pz_width - pz_mount_hole_offset)];
            for (x = x_pins, y = y_pins)
                translate([x, y, 0])
                {
                    //translate([0, 0, -2*shell_thickness])
                    difference ()
                    {
                        $fn = 40;
                        length = 6.6; //magic
                        #cylinder(d=pz_mount_hole_dia_clearance*0.9, h=length);
                        #cylinder(d=pz_mount_hole_dia*1.1, h=length);
                    }
                }
        }
            
    }
}

/*
// something doesn't add up, measured prints do not equate
echo("inside length ", case_inside_length);
echo("inside width  ", case_inside_width);
echo("inside height  ", case_inside_height);

echo("outside length ", case_outside_length);
echo("outside width  ", case_outside_width);
echo("outside height ", case_outside_height);
*/

if (make_bottom) bottom();
if (make_top) top();
